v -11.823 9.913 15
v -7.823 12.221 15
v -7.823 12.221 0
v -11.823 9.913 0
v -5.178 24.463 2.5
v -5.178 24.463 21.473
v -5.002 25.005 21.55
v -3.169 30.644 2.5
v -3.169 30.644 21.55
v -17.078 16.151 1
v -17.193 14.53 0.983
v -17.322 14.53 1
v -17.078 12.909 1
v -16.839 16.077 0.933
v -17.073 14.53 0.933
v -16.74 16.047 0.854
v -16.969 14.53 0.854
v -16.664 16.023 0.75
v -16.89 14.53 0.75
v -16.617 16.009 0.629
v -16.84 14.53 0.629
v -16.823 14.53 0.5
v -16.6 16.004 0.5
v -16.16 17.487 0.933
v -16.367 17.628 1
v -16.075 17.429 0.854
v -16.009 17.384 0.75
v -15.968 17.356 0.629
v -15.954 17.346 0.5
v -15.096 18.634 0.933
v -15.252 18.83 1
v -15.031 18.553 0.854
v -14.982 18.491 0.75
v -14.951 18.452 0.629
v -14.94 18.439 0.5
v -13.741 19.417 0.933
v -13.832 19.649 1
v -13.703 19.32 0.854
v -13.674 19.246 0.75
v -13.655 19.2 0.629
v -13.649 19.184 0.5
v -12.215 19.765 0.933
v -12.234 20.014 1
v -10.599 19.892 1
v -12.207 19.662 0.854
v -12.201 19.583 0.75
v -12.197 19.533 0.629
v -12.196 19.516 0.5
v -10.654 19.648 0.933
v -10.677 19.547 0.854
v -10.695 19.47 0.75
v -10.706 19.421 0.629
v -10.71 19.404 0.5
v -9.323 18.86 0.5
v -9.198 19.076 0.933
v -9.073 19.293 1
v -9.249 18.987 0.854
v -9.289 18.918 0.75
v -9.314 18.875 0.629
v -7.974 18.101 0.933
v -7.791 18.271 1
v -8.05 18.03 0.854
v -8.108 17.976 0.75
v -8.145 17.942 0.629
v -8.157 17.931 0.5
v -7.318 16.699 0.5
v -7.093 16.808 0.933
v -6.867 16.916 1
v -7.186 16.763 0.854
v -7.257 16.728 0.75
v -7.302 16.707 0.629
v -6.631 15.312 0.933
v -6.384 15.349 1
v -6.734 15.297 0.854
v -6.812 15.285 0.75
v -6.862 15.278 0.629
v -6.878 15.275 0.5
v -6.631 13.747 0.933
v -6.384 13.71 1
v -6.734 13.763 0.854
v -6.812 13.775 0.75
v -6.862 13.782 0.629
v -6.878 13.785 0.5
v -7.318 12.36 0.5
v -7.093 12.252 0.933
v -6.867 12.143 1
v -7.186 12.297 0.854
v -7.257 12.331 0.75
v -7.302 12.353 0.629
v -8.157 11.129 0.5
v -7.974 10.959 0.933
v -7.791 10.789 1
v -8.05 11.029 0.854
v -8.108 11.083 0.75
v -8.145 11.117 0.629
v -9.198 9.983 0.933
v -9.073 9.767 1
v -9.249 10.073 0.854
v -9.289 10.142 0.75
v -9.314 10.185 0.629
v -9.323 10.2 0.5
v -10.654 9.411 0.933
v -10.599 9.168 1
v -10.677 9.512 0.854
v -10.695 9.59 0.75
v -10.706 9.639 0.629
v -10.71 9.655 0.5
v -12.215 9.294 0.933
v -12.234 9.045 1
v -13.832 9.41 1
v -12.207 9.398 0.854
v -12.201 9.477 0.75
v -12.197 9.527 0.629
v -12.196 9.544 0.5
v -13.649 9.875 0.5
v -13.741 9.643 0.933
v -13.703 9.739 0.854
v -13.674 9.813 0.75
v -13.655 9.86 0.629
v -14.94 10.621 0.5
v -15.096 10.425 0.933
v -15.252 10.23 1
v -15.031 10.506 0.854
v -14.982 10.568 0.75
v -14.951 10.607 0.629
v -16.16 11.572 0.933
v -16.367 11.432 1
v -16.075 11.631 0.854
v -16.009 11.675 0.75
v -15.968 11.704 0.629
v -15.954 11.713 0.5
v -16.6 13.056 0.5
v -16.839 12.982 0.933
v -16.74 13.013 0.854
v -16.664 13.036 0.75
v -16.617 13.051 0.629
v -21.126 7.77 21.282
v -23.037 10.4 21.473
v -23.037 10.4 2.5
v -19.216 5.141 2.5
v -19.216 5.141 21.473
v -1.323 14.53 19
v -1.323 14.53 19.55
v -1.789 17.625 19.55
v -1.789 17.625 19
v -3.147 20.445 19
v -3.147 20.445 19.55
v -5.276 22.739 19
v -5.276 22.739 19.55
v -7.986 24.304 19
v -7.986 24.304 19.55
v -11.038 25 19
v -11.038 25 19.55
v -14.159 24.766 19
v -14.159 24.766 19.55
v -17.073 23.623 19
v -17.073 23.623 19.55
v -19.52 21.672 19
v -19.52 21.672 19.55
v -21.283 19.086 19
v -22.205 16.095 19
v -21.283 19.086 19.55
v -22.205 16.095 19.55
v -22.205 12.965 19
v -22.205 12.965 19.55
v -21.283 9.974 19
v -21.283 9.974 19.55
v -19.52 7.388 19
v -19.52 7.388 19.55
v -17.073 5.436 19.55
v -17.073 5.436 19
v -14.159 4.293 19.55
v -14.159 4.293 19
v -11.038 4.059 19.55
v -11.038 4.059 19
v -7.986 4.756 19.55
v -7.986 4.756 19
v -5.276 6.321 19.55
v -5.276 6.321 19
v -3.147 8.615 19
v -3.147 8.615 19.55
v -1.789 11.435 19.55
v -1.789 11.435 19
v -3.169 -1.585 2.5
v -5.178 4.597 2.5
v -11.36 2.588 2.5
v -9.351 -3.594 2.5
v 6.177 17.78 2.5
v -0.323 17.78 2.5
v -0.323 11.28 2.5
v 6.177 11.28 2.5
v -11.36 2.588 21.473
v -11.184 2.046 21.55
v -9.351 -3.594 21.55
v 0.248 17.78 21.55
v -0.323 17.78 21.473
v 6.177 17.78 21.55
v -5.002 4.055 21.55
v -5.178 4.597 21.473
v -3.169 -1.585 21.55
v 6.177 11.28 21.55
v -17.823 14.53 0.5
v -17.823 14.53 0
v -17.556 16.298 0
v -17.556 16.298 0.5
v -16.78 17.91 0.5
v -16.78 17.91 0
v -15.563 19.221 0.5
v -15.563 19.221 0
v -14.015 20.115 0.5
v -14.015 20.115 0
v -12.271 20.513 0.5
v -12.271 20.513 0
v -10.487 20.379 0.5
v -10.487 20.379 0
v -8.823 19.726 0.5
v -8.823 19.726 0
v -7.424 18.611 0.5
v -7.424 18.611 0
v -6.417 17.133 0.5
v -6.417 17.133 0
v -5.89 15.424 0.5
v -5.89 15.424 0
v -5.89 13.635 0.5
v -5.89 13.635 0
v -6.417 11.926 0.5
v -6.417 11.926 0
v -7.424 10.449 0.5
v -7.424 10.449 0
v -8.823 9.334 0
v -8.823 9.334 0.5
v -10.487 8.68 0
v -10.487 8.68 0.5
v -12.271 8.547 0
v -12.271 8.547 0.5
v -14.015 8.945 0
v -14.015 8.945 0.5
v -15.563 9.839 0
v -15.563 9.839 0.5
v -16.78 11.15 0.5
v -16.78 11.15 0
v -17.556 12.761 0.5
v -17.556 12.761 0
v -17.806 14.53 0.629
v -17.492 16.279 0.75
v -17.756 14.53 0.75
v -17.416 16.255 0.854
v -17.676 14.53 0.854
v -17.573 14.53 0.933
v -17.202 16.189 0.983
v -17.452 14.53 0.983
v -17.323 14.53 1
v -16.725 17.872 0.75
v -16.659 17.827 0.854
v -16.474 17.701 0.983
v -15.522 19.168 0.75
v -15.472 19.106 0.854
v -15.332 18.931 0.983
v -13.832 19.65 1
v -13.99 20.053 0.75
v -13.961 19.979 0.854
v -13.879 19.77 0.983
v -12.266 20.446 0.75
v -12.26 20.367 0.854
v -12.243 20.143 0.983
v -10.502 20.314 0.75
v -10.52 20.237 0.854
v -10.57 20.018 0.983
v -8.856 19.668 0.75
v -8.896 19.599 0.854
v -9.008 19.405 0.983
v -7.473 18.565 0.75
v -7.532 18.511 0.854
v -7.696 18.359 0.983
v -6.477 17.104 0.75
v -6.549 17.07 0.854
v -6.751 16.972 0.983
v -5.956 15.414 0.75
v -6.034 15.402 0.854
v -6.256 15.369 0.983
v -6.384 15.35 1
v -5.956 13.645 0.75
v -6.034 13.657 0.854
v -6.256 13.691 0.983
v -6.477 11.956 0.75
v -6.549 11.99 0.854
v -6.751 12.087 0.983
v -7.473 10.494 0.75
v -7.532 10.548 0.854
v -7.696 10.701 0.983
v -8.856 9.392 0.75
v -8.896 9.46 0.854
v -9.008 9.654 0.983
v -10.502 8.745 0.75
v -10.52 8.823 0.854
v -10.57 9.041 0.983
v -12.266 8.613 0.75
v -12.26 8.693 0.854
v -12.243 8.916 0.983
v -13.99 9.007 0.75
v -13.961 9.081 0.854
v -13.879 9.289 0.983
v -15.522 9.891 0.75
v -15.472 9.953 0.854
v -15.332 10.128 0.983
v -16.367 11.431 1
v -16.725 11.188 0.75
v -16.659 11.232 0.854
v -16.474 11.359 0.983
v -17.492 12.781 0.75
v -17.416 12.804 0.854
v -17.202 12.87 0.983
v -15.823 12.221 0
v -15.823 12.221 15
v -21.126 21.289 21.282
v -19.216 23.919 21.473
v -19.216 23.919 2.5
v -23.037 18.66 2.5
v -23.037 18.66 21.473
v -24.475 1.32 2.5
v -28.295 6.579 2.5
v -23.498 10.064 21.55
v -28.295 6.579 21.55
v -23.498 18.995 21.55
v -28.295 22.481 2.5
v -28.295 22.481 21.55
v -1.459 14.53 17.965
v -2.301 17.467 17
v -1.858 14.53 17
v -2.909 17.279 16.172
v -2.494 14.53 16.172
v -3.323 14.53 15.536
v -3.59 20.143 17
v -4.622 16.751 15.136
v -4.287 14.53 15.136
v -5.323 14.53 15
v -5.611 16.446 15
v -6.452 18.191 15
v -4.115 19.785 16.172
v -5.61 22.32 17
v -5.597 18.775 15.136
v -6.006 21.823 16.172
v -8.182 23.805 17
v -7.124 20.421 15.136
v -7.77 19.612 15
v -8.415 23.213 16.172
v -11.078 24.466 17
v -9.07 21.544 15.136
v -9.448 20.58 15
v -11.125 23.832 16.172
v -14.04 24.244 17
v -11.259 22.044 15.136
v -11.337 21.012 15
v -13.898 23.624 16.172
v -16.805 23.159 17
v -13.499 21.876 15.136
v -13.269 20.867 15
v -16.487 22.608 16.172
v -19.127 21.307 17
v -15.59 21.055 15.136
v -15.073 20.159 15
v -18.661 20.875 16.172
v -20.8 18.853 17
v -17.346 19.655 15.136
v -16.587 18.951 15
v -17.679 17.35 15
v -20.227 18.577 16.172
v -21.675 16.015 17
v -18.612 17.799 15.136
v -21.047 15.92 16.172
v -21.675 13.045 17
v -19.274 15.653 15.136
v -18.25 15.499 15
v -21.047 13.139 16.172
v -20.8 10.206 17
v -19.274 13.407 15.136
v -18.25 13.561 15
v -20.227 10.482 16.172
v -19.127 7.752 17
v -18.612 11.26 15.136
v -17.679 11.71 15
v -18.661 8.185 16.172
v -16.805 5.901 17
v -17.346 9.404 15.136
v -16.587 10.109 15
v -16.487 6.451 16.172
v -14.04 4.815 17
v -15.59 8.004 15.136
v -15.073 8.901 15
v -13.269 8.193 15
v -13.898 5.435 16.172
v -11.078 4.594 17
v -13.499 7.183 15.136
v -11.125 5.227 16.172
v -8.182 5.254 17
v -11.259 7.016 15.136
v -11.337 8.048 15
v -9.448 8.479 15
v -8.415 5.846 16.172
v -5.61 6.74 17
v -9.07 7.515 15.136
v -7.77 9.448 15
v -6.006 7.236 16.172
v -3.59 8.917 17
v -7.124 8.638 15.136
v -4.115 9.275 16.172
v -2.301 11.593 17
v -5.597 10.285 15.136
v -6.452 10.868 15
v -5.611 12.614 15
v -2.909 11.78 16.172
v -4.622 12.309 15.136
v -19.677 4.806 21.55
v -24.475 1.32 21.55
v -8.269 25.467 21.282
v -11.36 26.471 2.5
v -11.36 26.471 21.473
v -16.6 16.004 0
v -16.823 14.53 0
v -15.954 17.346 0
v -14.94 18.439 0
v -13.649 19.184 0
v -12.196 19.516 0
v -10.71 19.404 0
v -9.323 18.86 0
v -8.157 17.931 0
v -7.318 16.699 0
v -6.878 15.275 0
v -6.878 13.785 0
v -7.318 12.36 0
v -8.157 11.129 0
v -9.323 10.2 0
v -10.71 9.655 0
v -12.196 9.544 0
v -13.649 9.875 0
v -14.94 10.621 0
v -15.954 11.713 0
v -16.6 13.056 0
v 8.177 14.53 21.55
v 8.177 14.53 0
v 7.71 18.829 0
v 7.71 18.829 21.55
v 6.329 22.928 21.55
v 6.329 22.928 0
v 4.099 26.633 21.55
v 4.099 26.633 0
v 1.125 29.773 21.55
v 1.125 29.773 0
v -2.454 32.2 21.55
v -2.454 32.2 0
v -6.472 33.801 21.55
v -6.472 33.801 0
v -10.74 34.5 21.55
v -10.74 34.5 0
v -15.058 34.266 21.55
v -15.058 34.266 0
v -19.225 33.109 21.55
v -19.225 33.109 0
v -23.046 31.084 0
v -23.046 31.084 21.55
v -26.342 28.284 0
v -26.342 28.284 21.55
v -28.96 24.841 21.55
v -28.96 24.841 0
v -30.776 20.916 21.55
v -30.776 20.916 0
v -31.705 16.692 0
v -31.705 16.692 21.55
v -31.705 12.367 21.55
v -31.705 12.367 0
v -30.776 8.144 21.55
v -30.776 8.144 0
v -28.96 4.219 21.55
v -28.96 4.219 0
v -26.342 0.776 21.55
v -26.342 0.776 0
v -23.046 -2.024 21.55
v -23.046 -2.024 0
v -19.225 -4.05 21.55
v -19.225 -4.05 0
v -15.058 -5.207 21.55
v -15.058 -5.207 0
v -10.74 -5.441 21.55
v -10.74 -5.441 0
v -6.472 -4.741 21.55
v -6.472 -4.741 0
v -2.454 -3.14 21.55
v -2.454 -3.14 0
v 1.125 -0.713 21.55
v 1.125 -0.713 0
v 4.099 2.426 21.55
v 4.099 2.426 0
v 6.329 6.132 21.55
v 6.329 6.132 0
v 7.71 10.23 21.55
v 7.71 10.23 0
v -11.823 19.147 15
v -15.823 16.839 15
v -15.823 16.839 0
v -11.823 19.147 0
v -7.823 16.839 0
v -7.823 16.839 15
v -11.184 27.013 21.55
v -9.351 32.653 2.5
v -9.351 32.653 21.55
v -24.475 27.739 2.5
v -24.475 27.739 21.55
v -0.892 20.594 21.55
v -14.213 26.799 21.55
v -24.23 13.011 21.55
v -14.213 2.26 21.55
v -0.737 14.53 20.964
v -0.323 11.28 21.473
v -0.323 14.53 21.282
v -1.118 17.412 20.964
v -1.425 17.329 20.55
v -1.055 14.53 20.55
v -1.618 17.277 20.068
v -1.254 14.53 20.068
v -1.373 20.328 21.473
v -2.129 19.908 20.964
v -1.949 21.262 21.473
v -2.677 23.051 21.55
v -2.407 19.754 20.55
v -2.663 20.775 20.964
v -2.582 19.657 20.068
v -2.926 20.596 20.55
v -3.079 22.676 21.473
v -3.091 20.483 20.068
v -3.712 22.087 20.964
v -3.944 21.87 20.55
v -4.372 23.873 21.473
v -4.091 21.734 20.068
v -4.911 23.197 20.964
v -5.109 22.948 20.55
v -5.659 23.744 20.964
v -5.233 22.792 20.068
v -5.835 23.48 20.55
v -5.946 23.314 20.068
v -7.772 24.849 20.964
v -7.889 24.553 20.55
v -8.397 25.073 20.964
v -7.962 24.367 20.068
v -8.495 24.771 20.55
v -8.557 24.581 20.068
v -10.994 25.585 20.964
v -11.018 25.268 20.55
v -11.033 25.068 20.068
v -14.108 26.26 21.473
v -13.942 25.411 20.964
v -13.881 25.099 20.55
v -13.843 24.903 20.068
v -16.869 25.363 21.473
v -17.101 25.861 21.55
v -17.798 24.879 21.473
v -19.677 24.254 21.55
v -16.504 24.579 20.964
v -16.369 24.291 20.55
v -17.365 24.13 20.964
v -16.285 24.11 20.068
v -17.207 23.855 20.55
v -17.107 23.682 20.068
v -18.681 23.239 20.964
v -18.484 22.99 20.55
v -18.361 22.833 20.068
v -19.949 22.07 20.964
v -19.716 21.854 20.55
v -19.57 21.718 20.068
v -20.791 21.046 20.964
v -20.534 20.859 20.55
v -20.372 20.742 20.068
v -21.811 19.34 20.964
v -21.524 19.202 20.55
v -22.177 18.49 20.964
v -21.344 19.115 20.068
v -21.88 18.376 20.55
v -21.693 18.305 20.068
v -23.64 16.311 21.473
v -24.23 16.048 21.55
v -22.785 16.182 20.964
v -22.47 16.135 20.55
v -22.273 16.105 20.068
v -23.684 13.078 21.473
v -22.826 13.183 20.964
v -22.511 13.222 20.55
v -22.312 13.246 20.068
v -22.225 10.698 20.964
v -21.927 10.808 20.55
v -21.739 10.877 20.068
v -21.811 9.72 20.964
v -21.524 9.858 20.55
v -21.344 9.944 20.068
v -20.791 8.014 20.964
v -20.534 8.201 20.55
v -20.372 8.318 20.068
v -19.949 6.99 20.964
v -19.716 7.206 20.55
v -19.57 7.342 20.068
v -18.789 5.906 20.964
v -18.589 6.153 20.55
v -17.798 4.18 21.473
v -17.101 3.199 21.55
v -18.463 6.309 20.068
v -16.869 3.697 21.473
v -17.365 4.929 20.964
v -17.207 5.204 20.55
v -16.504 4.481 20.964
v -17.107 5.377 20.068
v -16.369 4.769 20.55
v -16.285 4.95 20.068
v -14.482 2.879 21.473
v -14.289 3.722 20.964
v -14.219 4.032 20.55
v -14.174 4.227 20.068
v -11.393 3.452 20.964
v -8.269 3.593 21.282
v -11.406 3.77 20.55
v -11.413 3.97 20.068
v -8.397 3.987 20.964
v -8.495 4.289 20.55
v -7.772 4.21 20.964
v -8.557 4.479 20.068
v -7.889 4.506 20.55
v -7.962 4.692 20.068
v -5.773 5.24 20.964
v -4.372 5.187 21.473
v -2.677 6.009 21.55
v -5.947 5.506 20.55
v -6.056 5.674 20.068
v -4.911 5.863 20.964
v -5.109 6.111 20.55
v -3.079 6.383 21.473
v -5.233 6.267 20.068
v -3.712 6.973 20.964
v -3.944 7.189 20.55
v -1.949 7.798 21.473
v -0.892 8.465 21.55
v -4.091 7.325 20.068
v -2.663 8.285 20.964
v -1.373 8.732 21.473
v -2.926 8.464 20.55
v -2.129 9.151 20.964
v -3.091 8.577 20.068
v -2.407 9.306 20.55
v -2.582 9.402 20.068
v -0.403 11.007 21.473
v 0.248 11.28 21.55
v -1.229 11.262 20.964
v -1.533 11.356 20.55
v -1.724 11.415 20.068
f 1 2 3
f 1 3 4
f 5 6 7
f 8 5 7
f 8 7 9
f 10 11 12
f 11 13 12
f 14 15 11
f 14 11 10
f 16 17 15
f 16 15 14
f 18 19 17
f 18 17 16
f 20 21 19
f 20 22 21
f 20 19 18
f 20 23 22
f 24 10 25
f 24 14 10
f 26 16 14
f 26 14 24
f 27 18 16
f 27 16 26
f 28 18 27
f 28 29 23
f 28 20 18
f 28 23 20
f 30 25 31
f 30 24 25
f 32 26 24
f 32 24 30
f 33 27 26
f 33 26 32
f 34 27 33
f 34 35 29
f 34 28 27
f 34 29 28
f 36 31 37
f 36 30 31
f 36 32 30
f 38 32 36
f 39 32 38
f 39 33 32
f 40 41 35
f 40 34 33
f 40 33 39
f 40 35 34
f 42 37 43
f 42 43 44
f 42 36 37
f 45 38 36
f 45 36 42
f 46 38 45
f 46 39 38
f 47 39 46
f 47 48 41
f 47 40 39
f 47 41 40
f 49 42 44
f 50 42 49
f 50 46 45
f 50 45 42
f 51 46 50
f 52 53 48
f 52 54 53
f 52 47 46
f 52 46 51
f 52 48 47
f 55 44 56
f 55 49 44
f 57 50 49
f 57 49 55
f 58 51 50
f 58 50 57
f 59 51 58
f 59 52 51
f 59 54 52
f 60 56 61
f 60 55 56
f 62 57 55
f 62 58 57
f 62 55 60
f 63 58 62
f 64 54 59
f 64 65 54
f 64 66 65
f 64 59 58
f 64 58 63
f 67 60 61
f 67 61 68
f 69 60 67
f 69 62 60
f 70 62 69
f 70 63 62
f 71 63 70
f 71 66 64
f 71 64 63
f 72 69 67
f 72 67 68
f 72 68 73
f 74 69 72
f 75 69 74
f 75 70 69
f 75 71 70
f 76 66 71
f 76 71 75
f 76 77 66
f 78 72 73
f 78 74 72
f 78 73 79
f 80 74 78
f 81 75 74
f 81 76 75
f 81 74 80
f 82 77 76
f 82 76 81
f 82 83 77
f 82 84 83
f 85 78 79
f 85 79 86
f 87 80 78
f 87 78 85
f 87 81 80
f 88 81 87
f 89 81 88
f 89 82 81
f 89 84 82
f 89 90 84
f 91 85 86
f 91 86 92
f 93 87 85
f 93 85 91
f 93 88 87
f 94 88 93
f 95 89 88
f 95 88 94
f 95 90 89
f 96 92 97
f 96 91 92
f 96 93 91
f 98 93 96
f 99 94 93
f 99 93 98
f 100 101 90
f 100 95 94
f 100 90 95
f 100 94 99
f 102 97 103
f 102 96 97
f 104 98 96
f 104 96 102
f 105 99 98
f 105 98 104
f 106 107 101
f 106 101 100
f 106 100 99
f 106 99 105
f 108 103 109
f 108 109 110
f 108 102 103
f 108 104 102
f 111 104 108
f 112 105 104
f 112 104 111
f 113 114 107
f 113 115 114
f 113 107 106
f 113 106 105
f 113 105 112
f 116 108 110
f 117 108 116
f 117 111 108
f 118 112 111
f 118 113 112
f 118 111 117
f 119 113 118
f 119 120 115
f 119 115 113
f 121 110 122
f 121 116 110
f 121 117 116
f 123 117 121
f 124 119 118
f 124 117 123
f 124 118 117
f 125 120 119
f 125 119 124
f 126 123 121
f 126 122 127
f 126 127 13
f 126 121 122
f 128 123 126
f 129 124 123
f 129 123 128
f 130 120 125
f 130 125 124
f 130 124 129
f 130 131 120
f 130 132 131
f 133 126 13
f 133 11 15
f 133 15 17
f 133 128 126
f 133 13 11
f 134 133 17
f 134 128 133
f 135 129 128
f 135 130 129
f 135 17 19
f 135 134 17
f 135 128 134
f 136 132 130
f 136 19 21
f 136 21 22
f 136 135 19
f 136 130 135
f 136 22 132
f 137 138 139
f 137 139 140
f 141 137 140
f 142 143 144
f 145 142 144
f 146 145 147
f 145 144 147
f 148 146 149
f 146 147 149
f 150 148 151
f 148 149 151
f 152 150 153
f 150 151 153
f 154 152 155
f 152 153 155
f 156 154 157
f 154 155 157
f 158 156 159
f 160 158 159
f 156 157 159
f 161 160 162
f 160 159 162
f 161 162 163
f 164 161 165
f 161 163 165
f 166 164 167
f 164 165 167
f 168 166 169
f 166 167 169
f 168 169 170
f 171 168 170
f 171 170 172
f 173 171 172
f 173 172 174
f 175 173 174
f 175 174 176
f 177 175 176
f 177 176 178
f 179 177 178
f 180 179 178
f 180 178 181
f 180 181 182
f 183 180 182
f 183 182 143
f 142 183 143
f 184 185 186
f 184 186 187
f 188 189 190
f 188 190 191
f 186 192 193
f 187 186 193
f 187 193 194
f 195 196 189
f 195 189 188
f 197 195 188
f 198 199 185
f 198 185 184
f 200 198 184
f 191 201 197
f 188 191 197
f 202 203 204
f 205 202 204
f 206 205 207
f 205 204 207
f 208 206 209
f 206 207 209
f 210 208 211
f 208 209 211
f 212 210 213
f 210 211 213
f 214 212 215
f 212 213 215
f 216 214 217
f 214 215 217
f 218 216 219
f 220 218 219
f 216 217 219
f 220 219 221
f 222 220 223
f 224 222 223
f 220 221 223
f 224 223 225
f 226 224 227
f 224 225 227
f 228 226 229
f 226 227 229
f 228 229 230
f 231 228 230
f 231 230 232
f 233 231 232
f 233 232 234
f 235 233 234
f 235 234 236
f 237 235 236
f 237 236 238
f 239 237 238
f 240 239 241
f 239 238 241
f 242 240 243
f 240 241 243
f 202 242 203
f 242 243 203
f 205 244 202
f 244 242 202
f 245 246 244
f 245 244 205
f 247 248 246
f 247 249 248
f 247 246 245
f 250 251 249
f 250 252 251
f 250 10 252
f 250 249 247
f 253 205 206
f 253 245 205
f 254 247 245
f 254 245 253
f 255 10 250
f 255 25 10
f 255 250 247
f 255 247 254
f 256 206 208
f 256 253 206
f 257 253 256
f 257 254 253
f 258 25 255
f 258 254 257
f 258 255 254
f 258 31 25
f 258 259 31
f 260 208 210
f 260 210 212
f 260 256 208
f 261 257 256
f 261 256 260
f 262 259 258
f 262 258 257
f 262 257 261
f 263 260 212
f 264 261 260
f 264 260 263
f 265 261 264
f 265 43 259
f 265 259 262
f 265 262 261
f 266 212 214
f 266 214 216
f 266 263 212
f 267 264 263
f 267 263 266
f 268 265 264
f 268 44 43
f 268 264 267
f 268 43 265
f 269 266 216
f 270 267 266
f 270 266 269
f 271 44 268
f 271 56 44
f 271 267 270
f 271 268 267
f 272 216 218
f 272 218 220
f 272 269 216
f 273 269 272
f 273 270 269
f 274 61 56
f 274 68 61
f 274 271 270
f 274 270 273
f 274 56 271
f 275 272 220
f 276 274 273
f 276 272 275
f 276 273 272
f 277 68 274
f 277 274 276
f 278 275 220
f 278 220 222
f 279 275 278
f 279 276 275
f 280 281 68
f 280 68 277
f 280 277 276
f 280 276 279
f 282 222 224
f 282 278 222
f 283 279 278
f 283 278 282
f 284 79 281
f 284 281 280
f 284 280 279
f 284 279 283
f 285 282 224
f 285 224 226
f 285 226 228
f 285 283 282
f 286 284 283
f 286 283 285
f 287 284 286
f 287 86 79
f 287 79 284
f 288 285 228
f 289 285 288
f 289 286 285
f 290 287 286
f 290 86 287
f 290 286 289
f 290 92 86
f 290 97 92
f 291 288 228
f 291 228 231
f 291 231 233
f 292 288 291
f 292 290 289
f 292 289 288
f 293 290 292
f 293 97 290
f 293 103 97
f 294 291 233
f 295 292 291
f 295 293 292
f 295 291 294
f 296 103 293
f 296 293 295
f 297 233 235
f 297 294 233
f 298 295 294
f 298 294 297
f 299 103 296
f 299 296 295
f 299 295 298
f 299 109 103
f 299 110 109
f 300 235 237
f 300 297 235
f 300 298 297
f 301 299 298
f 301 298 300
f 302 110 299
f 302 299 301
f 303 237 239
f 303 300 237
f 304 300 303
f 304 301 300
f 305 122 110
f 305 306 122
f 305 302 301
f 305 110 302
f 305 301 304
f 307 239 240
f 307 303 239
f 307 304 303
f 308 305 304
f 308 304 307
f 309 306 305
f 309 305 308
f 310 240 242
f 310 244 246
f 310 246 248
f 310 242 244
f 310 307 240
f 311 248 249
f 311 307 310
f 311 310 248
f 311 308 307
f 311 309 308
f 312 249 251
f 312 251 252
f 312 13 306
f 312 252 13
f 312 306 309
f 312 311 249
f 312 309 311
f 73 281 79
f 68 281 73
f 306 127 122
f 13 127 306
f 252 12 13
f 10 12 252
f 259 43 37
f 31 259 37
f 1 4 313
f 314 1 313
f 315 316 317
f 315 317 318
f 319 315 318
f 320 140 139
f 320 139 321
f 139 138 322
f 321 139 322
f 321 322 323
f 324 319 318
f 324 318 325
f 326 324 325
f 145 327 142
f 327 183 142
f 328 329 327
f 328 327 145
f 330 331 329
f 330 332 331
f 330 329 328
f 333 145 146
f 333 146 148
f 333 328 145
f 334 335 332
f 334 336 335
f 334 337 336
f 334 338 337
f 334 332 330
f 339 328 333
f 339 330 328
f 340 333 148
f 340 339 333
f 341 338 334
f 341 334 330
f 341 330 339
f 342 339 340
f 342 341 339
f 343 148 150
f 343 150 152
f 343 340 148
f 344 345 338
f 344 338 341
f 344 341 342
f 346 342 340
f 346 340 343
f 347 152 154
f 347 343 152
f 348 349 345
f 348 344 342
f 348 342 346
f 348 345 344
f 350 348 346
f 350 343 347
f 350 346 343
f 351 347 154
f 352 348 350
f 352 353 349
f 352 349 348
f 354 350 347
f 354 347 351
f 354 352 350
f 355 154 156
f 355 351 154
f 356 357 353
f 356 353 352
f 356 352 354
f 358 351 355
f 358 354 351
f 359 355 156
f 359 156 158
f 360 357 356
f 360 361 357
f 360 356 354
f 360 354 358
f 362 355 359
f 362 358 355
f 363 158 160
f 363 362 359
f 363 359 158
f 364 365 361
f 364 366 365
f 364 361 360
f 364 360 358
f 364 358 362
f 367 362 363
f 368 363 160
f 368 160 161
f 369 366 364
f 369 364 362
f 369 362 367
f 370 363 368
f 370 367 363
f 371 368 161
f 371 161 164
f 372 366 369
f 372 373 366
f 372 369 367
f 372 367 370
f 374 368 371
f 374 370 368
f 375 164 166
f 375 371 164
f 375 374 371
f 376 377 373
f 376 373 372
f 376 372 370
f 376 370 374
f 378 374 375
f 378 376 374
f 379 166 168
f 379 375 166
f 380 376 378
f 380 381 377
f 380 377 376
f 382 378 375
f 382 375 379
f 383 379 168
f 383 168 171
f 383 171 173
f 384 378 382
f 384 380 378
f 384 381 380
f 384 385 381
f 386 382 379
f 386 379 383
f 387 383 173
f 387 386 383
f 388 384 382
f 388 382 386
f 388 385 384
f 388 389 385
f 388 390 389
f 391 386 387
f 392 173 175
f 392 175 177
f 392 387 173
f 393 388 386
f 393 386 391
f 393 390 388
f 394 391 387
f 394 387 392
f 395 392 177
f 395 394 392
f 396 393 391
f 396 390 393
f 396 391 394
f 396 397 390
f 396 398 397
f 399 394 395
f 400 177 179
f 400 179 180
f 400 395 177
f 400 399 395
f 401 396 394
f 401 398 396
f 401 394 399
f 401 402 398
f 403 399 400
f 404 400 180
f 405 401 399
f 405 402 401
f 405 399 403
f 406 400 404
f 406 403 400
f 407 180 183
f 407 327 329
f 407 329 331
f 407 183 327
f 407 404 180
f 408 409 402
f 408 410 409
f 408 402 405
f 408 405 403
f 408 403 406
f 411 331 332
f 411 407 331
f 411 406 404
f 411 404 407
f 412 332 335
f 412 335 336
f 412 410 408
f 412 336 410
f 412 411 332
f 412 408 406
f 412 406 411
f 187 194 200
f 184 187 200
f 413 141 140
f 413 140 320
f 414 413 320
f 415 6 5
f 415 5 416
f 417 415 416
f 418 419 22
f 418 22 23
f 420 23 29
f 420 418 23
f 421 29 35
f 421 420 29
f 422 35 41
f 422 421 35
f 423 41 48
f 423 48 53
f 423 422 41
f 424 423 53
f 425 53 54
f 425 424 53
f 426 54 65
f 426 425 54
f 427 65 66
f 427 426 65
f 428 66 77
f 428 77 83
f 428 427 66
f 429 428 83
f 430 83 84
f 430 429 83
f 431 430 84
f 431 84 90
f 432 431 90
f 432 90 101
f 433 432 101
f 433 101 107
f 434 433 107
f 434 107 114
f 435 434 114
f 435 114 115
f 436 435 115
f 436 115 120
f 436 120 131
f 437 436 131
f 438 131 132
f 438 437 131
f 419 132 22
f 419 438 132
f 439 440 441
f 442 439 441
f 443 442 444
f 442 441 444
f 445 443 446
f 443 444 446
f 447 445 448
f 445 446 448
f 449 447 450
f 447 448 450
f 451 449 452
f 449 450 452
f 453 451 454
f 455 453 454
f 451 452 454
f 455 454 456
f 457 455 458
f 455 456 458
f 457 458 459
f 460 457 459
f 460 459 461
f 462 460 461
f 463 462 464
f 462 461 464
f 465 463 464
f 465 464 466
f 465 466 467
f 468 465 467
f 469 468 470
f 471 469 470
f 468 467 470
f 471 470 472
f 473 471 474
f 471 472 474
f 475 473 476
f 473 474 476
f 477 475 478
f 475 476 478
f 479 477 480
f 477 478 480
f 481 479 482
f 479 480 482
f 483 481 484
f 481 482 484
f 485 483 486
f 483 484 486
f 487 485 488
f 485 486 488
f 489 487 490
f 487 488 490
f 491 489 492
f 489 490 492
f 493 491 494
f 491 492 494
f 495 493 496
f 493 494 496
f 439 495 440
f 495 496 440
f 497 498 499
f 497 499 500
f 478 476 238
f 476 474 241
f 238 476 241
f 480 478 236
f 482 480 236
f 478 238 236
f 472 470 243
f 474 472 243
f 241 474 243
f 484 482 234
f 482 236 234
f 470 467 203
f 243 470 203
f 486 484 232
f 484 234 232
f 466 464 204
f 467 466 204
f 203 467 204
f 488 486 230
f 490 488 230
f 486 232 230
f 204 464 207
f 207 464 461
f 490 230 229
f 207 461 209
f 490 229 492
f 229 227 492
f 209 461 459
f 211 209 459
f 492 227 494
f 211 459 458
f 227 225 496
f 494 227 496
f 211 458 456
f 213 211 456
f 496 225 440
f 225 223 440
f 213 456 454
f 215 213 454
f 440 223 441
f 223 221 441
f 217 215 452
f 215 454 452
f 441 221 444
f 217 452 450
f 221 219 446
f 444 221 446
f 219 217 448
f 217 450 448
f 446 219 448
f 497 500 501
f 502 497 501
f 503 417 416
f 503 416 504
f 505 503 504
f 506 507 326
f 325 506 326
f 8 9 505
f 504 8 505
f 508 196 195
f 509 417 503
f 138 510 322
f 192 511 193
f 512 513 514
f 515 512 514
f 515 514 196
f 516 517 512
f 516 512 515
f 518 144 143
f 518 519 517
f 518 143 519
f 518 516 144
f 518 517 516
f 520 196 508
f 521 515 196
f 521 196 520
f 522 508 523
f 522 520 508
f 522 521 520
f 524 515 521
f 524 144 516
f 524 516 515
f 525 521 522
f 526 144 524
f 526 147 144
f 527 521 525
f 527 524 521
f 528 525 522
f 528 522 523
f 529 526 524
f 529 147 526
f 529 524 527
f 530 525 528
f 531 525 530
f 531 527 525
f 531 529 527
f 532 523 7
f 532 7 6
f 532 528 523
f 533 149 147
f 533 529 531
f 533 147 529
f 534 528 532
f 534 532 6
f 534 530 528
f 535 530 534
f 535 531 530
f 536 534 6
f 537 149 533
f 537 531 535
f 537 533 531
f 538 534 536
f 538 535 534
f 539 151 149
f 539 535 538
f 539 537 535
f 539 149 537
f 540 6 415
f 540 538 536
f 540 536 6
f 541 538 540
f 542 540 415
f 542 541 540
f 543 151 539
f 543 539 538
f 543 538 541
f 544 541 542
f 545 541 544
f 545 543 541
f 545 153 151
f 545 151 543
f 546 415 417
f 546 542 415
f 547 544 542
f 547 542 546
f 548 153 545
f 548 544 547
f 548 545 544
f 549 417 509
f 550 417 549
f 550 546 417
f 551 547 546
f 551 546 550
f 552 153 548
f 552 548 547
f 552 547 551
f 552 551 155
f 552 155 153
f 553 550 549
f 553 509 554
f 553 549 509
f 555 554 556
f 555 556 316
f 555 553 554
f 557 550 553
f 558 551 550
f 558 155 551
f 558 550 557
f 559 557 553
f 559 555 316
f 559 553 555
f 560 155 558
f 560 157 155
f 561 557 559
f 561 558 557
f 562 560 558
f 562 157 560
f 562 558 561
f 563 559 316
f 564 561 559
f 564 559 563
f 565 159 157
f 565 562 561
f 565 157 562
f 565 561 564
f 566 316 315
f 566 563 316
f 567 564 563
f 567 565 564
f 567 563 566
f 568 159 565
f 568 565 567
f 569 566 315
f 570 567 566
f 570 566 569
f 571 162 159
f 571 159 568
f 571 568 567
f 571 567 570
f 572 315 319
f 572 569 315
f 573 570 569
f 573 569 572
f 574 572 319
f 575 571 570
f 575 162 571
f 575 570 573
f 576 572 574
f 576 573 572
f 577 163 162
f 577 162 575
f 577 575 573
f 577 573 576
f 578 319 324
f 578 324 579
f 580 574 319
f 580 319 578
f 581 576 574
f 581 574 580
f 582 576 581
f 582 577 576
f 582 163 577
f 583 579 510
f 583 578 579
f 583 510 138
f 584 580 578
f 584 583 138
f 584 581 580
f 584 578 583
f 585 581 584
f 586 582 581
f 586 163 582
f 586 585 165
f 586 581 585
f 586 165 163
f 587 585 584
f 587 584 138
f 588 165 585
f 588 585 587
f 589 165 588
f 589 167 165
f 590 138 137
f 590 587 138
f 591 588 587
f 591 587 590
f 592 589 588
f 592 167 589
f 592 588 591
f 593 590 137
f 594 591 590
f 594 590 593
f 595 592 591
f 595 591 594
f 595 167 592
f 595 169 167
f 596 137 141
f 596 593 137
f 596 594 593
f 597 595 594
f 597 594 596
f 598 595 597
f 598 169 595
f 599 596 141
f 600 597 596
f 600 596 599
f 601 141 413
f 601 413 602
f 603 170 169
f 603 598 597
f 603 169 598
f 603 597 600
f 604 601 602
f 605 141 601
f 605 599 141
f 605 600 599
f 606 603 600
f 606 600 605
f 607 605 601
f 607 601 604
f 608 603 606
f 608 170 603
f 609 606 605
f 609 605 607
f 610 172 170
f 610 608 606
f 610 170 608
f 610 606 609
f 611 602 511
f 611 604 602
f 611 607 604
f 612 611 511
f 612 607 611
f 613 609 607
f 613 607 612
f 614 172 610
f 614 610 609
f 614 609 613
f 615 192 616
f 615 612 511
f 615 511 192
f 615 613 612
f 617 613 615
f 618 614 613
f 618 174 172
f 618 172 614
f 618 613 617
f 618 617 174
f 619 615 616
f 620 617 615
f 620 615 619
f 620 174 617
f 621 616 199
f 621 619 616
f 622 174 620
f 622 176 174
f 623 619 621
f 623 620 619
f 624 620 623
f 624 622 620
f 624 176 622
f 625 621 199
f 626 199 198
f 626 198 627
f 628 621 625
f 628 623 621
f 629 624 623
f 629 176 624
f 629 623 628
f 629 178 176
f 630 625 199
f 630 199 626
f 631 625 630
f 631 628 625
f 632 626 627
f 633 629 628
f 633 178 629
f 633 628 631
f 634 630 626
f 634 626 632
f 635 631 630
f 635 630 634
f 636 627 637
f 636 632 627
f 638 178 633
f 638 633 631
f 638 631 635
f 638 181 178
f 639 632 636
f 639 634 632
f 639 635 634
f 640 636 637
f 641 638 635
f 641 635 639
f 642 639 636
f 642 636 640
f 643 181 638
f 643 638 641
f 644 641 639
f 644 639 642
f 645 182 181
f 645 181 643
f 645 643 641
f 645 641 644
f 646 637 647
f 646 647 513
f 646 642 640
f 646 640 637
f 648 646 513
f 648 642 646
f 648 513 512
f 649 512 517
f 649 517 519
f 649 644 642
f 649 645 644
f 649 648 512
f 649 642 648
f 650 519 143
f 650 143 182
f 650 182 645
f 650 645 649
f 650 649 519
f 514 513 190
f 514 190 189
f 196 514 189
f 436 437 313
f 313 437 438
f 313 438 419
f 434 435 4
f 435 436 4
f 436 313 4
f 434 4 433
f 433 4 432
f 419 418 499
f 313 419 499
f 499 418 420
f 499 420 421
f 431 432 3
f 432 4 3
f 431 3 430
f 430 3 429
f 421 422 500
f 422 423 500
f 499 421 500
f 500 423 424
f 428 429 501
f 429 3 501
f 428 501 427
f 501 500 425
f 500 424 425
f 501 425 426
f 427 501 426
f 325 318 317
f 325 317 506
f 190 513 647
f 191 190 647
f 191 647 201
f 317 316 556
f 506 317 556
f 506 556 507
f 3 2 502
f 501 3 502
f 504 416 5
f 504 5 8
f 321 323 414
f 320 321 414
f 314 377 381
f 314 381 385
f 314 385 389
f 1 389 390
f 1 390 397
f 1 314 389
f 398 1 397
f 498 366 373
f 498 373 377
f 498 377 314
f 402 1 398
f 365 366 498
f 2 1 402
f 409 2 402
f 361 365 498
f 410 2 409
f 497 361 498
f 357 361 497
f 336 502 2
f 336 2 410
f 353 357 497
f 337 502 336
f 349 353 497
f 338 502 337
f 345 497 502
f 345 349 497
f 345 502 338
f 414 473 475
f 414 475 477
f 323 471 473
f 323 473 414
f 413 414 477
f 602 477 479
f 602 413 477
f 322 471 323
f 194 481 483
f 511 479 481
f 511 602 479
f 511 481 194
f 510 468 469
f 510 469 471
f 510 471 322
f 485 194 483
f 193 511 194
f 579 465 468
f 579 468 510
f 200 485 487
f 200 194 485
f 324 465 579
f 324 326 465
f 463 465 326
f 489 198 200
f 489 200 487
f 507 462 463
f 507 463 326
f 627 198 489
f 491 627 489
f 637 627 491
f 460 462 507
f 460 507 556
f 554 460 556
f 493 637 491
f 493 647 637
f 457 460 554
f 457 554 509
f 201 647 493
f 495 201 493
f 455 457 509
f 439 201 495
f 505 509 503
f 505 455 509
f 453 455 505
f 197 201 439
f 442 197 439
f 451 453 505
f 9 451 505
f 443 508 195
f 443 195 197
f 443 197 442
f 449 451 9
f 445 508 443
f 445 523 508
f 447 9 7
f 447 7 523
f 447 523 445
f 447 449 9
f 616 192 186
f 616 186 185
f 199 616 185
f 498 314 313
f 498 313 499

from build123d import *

# Parameters (mm, degrees)
SKETCH1_R                       = 20
SKETCH1_R_2                     = 1
BOSS_EXTRUDE1_DEPTH             = 21.55
TAP_DRILL_FOR_M5X0_8_TAP1_D     = 4.2
TAP_DRILL_FOR_M5X0_8_TAP1_DEPTH = 5
TAP_DRILL_FOR_M5X0_8_TAP1_TIP   = 1.2618073
SKETCH4_W                       = 6.5
SKETCH4_H                       = 6.5
CUT_EXTRUDE1_DEPTH              = 19.05
CIRPATTERN1_COUNT               = 5
SKETCH5_R                       = 6
SKETCH5_R_2                     = 5
CUT_EXTRUDE2_DEPTH              = 1
FILLET3_R                       = 0.5
CUT_EXTRUDE3_START              = -21.55
SKETCH6_W                       = 8
SKETCH6_H                       = 4.618
SKETCH6_R                       = 2.1
CUT_EXTRUDE3_DEPTH              = 21.55
SKETCH7_R                       = 10.5
CUT_EXTRUDE4_DEPTH              = 6.55
FILLET4_R                       = 2
FILLET5_R                       = 4


# Some blends are built 0.0001 mm under size
with BuildPart() as part:
    # Sketch1 → Boss-Extrude1 (new body)
    with BuildSketch(Plane.XY):
        with Locations((-11.822558412, 14.529752947)):
            Circle(SKETCH1_R)
        with Locations((-11.822558412, 14.529752947)):
            Circle(SKETCH1_R_2, mode=Mode.SUBTRACT)
    extrude(amount=BOSS_EXTRUDE1_DEPTH)

    # Tap Drill for M5x0.8 Tap1
    with Locations(Plane.XY.offset(21.55)):
        with Locations((-11.822558412, 14.529752947)):
            Hole(TAP_DRILL_FOR_M5X0_8_TAP1_D / 2, depth=TAP_DRILL_FOR_M5X0_8_TAP1_DEPTH)
            with Locations((0, 0, -(TAP_DRILL_FOR_M5X0_8_TAP1_DEPTH + TAP_DRILL_FOR_M5X0_8_TAP1_TIP / 2))):  # 118° drill point
                Cone(0, TAP_DRILL_FOR_M5X0_8_TAP1_D / 2, TAP_DRILL_FOR_M5X0_8_TAP1_TIP, mode=Mode.SUBTRACT)

    # Sketch4 → Cut-Extrude1 (cut)
    with BuildSketch(Plane.XY.offset(21.55)):
        with Locations((2.927441588, 14.529752947)):
            Rectangle(SKETCH4_W, SKETCH4_H)
    cut_extrude1 = extrude(amount=-CUT_EXTRUDE1_DEPTH, mode=Mode.SUBTRACT)

    # CirPattern1: Cut-Extrude1 ×5 about axis
    cirpattern1_axis = Axis((-11.822558412, 14.529752947, 0), (0, 0, 1))
    for i in range(1, CIRPATTERN1_COUNT):
        add(cut_extrude1.rotate(cirpattern1_axis, i * 360 / CIRPATTERN1_COUNT), mode=Mode.SUBTRACT)

    # Sketch5 → Cut-Extrude2 (cut)
    with BuildSketch(Plane(origin=(0, 0, 0), x_dir=(-1, 0, 0), z_dir=(0, 0, -1))):
        with Locations((11.822558412, 14.529752947)):
            Circle(SKETCH5_R)
        with Locations((11.822558412, 14.529752947)):
            Circle(SKETCH5_R_2, mode=Mode.SUBTRACT)
    extrude(amount=-CUT_EXTRUDE2_DEPTH, mode=Mode.SUBTRACT)

    # Fillet3
    fillet3_edges = [part.edges().sort_by_distance(p)[0] for p in [
        (-5.822558412, 14.529752947, 1),
        (-6.822558412, 14.529752947, 1),
    ]]
    fillet(fillet3_edges, radius=FILLET3_R - 0.0001)  # a hair under: the kernel refuses the full size

    # Sketch6 → Cut-Extrude3 (cut)
    # profile 1 of 4: a face of its own
    with BuildSketch(Plane.XY.offset(21.55).offset(CUT_EXTRUDE3_START)):
        with Locations((-11.822558412, 14.529752947)):
            Rectangle(SKETCH6_W, SKETCH6_H)
        with Locations((-11.822558412, 14.529752947)):
            Circle(SKETCH6_R, mode=Mode.SUBTRACT)
    # profile 2 of 4: a face of its own
    with BuildSketch(Plane.XY.offset(21.55).offset(CUT_EXTRUDE3_START)):
        with Locations((-11.822558412, 14.529752947)):
            Circle(SKETCH6_R)
    # profile 3 of 4: a face of its own
    with BuildSketch(Plane.XY.offset(21.55).offset(CUT_EXTRUDE3_START)):
        Polygon((-11.822558412, 19.146549298), (-7.822558412, 16.838752947), (-15.822558412, 16.838752947), align=None)
    # profile 4 of 4: a face of its own
    with BuildSketch(Plane.XY.offset(21.55).offset(CUT_EXTRUDE3_START)):
        Polygon((-11.822558412, 9.912956595), (-15.822558412, 12.220752947), (-7.822558412, 12.220752947), align=None)
    extrude(amount=CUT_EXTRUDE3_DEPTH, mode=Mode.SUBTRACT)

    # Sketch7 → Cut-Extrude4 (cut)
    with BuildSketch(Plane.XY.offset(21.55)):
        with Locations((-11.822558412, 14.529752947)):
            Circle(SKETCH7_R)
    extrude(amount=-CUT_EXTRUDE4_DEPTH, mode=Mode.SUBTRACT)

    # Fillet4
    # the kernel refuses this fillet: 2 mm, written as the material it takes off along each edge
    with BuildSketch(Plane(origin=(-11.822558412, 14.529752947, 21.55), x_dir=(1, 0, 0), z_dir=(0, -1, 0))) as fillet4_piece_1:
        with BuildLine():
            CenterArc((10.5 + FILLET4_R, -FILLET4_R), FILLET4_R, 90, 90)
            Line((10.5, -FILLET4_R), (10.5, 0))
            Line((10.5, 0), (10.5 + FILLET4_R, 0))
        make_face()
    revolve(axis=Axis((-11.822558412, 14.529752947, 21.55), (0, 0, 1)), mode=Mode.SUBTRACT)

    # Fillet5
    fillet5_edges = [part.edges().sort_by_distance(p)[0] for p in [
        (-22.322558412, 14.529752947, 15),
    ]]
    fillet(fillet5_edges, radius=FILLET5_R)


solid = part.part
